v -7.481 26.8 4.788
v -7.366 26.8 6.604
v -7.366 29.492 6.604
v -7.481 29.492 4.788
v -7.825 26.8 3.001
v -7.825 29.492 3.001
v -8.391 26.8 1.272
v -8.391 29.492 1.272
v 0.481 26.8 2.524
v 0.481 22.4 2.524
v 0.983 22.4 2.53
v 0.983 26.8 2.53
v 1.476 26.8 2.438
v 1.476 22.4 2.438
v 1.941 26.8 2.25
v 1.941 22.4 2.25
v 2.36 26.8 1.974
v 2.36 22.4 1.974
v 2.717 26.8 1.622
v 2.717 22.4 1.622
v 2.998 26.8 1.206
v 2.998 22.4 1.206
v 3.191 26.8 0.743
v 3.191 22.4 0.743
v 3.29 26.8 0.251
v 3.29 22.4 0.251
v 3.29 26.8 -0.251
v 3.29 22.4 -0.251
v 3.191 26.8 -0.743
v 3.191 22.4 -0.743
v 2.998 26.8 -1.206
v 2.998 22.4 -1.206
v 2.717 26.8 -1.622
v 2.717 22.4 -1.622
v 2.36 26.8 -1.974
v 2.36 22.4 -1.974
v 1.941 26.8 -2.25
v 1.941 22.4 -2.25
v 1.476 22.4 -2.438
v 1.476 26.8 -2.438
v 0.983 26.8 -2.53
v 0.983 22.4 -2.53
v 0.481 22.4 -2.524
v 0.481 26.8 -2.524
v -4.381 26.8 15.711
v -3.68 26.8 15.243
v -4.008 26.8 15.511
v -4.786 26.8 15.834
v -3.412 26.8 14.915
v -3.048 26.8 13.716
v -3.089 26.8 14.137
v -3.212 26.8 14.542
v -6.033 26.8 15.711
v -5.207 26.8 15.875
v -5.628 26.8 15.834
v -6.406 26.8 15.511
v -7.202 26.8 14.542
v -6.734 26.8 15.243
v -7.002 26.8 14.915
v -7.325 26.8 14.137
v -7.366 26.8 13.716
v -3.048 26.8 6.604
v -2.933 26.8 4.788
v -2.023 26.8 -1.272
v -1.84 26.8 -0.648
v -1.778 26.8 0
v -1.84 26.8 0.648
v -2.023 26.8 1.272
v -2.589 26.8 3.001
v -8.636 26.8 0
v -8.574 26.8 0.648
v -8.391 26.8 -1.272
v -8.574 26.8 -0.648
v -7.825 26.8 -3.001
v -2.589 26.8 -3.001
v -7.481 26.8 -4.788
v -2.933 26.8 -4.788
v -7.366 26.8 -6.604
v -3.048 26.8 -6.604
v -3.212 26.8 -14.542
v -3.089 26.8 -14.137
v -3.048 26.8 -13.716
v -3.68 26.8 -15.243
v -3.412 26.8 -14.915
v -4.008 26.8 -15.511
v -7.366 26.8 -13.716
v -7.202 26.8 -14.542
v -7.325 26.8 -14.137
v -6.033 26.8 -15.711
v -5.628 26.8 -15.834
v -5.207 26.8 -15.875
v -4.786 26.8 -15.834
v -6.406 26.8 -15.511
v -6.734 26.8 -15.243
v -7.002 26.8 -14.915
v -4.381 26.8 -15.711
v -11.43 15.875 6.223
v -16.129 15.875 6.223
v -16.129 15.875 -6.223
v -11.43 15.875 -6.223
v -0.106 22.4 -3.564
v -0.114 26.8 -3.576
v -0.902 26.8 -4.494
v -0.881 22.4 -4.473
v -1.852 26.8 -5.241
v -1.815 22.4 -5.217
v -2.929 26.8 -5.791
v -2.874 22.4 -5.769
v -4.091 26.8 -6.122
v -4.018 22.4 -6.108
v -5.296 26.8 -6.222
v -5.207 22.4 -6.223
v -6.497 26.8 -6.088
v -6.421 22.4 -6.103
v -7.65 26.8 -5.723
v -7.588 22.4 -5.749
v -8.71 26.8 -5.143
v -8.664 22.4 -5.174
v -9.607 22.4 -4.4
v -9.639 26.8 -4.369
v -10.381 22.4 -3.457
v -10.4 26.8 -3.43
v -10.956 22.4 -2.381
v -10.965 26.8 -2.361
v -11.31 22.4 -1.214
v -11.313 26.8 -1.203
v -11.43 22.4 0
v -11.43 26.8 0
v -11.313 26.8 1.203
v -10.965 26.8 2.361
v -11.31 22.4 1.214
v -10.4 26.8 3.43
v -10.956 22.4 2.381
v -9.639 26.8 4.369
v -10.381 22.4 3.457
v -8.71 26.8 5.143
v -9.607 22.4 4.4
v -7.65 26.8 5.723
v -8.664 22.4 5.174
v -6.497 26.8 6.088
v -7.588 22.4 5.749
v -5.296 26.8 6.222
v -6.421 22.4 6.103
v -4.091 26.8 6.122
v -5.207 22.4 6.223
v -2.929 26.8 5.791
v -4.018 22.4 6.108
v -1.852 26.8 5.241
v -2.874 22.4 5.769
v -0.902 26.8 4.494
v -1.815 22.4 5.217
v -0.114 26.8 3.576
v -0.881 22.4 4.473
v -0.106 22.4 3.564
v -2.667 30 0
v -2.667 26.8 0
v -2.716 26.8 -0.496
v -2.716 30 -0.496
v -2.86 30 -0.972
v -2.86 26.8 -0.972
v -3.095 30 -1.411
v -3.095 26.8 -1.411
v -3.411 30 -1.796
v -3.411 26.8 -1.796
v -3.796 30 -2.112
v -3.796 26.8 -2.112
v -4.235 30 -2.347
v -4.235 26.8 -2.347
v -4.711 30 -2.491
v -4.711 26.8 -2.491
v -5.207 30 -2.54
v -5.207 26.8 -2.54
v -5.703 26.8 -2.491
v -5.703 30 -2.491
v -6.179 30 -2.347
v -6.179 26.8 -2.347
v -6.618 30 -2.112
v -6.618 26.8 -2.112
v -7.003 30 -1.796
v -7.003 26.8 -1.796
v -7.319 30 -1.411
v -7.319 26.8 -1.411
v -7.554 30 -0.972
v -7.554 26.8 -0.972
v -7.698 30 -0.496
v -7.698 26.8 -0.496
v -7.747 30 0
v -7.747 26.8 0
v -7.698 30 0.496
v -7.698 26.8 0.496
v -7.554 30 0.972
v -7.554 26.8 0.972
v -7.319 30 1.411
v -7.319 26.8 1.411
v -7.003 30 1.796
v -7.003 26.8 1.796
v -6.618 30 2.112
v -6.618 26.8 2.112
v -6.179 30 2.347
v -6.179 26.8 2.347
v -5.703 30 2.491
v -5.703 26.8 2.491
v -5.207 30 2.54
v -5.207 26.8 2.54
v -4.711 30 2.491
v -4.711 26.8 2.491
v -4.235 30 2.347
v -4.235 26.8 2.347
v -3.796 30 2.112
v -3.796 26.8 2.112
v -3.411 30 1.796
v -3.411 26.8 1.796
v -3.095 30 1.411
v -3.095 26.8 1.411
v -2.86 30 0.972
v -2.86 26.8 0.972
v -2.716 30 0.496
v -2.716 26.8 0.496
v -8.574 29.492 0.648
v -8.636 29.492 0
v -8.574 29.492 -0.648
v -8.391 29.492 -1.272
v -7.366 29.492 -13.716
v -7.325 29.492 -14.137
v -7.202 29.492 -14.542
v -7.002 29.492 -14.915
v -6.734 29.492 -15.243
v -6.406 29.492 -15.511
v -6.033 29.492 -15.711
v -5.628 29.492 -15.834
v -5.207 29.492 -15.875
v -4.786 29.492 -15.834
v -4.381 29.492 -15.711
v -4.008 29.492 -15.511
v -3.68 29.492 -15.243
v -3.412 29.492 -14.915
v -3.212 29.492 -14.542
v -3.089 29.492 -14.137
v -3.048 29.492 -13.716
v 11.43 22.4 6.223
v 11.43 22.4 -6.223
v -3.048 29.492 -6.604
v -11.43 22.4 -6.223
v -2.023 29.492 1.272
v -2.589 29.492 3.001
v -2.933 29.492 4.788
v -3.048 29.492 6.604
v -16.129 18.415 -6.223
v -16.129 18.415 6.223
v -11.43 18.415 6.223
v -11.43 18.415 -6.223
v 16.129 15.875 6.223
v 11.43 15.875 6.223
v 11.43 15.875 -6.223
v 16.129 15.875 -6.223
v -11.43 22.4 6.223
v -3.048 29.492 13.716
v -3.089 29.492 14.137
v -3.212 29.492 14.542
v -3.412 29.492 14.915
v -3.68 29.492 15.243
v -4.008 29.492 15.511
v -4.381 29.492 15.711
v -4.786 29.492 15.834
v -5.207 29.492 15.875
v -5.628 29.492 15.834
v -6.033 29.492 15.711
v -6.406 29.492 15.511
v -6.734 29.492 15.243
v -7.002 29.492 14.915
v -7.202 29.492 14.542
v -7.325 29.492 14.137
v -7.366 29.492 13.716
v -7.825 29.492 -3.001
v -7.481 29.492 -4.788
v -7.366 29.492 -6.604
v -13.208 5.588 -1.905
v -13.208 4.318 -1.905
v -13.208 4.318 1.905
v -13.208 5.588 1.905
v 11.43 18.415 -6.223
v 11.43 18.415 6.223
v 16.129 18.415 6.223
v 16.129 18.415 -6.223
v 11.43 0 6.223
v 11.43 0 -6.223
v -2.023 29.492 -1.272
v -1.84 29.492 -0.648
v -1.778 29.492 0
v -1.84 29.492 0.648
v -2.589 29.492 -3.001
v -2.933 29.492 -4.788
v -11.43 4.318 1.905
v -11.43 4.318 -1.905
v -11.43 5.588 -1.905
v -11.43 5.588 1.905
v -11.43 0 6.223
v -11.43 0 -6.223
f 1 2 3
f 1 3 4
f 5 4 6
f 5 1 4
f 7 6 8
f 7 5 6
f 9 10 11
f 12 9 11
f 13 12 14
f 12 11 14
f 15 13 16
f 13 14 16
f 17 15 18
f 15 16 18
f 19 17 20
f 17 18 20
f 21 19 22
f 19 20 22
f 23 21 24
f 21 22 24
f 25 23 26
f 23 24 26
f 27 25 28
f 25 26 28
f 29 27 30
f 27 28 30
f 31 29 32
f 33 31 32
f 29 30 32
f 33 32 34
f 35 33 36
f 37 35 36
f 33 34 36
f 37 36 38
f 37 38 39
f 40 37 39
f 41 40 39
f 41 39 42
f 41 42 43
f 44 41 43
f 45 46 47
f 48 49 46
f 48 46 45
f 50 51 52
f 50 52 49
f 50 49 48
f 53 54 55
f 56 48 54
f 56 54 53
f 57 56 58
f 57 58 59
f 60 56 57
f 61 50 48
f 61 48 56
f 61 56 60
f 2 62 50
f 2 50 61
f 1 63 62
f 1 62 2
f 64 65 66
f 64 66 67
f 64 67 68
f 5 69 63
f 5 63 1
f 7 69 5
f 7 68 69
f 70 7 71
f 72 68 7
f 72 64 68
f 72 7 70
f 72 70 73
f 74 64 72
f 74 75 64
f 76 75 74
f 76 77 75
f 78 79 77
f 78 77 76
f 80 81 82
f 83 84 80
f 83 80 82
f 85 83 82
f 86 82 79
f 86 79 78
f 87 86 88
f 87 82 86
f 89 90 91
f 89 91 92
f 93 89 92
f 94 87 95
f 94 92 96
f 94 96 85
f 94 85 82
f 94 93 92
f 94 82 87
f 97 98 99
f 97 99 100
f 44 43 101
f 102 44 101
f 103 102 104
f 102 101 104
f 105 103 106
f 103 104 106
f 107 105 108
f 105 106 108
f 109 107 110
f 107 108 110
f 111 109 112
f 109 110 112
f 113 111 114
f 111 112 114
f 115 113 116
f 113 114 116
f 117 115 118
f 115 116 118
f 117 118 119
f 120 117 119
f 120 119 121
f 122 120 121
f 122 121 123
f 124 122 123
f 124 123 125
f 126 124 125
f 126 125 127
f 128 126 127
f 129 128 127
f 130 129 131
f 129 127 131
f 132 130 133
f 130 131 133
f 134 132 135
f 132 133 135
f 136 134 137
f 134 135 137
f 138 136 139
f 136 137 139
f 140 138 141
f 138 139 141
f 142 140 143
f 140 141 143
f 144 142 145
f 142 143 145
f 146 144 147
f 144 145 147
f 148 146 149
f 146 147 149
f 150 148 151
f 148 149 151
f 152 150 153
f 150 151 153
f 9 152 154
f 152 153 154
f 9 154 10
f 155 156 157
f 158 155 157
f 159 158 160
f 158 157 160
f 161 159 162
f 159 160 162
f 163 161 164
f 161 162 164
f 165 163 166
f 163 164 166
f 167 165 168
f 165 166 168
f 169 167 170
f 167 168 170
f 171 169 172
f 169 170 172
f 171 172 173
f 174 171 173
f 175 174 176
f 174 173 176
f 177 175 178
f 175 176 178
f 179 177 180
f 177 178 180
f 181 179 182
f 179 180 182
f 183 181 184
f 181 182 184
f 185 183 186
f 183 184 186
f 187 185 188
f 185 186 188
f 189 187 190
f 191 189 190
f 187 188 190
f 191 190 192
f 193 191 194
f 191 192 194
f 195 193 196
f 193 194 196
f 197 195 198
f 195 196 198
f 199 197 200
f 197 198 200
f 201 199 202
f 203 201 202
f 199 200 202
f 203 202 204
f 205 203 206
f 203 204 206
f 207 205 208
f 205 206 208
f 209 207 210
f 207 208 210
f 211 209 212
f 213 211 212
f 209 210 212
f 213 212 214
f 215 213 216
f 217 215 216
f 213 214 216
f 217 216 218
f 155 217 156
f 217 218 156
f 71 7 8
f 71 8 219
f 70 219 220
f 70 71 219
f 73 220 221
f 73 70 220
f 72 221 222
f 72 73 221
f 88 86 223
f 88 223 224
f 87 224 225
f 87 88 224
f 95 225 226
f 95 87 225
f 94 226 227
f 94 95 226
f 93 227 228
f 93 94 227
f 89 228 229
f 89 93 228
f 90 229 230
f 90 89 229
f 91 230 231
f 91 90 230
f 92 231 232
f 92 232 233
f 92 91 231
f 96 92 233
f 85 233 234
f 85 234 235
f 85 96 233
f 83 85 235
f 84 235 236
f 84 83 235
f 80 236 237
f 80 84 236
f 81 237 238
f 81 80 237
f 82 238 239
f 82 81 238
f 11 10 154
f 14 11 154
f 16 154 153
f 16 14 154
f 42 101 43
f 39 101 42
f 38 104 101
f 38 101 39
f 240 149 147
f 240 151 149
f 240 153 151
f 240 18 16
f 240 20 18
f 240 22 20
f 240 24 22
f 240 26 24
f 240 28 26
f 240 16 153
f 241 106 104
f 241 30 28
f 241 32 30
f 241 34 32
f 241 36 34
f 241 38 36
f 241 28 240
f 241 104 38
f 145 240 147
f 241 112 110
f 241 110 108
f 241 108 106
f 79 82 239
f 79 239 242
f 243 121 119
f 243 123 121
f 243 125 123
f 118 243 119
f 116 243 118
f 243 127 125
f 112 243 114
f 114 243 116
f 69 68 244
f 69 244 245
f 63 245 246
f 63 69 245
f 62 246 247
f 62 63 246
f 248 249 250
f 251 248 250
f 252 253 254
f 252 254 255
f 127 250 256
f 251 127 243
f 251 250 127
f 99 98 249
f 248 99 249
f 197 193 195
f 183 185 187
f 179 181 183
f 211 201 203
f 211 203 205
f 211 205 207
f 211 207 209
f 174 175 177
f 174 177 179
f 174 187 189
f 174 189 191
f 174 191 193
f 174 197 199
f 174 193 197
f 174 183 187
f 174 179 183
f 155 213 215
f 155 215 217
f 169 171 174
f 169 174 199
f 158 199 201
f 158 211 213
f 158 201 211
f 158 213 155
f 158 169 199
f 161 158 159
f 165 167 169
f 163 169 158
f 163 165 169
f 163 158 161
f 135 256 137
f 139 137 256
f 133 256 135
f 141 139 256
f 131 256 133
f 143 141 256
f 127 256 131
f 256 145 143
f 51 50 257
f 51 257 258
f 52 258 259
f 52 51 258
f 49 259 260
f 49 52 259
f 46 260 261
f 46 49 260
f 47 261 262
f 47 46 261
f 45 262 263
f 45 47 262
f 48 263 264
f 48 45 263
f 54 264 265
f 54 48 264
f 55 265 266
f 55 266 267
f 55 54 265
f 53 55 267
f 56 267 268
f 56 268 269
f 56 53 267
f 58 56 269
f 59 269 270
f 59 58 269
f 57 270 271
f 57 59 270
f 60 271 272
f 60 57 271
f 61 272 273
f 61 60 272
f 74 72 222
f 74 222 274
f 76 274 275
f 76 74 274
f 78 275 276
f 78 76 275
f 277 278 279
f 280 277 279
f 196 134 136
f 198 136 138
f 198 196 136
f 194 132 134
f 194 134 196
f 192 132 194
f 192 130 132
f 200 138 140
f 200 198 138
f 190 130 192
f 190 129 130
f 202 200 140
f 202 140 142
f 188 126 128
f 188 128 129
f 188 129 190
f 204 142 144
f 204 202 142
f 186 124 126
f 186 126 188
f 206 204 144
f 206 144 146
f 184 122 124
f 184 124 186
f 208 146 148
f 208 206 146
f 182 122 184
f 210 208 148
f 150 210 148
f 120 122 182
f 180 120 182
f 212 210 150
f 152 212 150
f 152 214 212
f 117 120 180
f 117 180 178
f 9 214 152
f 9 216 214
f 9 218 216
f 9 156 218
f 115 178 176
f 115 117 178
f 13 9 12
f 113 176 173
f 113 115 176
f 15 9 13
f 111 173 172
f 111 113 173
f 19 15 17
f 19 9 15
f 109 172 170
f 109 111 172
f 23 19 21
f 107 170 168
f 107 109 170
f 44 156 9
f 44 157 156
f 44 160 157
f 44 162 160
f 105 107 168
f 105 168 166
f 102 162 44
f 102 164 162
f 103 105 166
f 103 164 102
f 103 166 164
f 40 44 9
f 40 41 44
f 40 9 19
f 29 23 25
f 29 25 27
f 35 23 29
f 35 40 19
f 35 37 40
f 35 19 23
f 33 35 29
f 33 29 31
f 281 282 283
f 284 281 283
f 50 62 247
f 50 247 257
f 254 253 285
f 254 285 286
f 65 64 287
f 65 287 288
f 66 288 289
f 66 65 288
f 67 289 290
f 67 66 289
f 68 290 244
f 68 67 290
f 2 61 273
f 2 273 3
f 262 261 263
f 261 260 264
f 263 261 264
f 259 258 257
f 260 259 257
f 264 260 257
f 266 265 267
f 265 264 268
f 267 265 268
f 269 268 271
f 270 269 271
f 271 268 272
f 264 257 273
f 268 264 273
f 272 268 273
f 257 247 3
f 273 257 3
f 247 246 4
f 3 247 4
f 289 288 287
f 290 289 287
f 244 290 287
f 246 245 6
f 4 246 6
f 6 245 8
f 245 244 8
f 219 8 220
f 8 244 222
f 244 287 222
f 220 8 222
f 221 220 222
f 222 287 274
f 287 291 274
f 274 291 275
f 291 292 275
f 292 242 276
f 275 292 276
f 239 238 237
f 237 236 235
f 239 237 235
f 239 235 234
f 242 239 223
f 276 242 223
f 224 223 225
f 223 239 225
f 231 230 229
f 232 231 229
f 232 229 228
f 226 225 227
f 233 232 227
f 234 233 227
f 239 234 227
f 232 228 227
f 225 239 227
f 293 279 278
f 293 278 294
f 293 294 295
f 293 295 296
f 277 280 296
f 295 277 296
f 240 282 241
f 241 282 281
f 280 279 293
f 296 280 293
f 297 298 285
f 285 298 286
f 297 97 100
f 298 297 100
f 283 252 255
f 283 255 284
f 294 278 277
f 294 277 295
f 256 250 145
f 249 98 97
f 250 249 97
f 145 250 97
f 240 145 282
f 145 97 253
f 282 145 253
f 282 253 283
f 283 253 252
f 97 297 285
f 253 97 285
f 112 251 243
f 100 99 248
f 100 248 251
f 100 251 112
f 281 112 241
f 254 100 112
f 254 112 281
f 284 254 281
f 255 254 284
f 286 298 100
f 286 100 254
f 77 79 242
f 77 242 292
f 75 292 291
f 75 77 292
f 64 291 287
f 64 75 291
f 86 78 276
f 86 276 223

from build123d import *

# Parameters (mm, degrees)
SKETCH1_W           = 22.86
SKETCH1_H           = 12.446
BOSS_EXTRUDE1_DEPTH = 22.4
SKETCH3_W           = 4.699
SKETCH3_H           = 2.54
BOSS_EXTRUDE3_DEPTH = 12.446
BOSS_EXTRUDE4_DEPTH = 4.4
SKETCH5_R           = 2.54
BOSS_EXTRUDE5_DEPTH = 3.2
BOSS_EXTRUDE6_DEPTH = 2.692
BOSS_EXTRUDE7_START = -4.318
SKETCH7_W           = 1.778
SKETCH7_H           = 3.81
BOSS_EXTRUDE7_DEPTH = 1.27


with BuildPart() as part:
    # Sketch1 → Boss-Extrude1 (new body)
    with BuildSketch(Plane(origin=(0, 0, 0), x_dir=(1, 0, 0), z_dir=(0, 1, 0))):
        Rectangle(SKETCH1_W, SKETCH1_H)
    extrude(amount=BOSS_EXTRUDE1_DEPTH)

    # Sketch3 → Boss-Extrude3 (add)
    with BuildSketch(Plane.XY.offset(6.223)):
        with Locations((-13.7795, 17.145)):
            Rectangle(SKETCH3_W, SKETCH3_H)
        with Locations((13.7795, 17.145)):
            Rectangle(SKETCH3_W, SKETCH3_H)
    extrude(amount=-BOSS_EXTRUDE3_DEPTH)

    # Sketch4 → Boss-Extrude4 (add)
    with BuildSketch(Plane(origin=(0, 22.4, 0), x_dir=(1, 0, 0), z_dir=(0, 1, 0))):
        with BuildLine():
            ThreePointArc((0.480978723, 2.524406275), (-11.43, 0), (0.480978723, -2.524406275))
            ThreePointArc((0.480978723, -2.524406275), (3.302, 0), (0.480978723, 2.524406275))
        make_face()
    extrude(amount=BOSS_EXTRUDE4_DEPTH)

    # Sketch5 → Boss-Extrude5 (add)
    with BuildSketch(Plane(origin=(0, 26.8, 0), x_dir=(1, 0, 0), z_dir=(0, 1, 0))):
        with Locations((-5.207, 0)):
            Circle(SKETCH5_R)
    extrude(amount=BOSS_EXTRUDE5_DEPTH)


with BuildPart() as body_2:
    # Sketch6 → Boss-Extrude6 (new body)
    with BuildSketch(Plane(origin=(0, 26.8, 0), x_dir=(1, 0, 0), z_dir=(0, 1, 0))):
        with BuildLine():
            Line((-7.366, 6.604), (-7.366, 13.716))
            ThreePointArc((-7.366, 13.716), (-5.207, 15.875), (-3.048, 13.716))
            Line((-3.048, 13.716), (-3.048, 6.604))
            ThreePointArc((-3.048, 6.604), (-2.789317484, 3.88905433), (-2.022579173, 1.271811698))
            ThreePointArc((-2.022579173, 1.271811698), (-1.778, 0), (-2.022579173, -1.271811698))
            ThreePointArc((-2.022579173, -1.271811698), (-2.789317484, -3.88905433), (-3.048, -6.604))
            Line((-3.048, -6.604), (-3.048, -13.716))
            ThreePointArc((-3.048, -13.716), (-5.207, -15.875), (-7.366, -13.716))
            Line((-7.366, -13.716), (-7.366, -6.604))
            ThreePointArc((-7.366, -6.604), (-7.624682516, -3.88905433), (-8.391420827, -1.271811698))
            ThreePointArc((-8.391420827, -1.271811698), (-8.636, 0), (-8.391420827, 1.271811698))
            ThreePointArc((-8.391420827, 1.271811698), (-7.624682516, 3.88905433), (-7.366, 6.604))
        make_face()
    extrude(amount=BOSS_EXTRUDE6_DEPTH)


with BuildPart() as body_3:
    # Sketch7 → Boss-Extrude7 (new body)
    with BuildSketch(Plane.XZ.offset(BOSS_EXTRUDE7_START)):
        with Locations((-12.319, 0)):
            Rectangle(SKETCH7_W, SKETCH7_H)
    extrude(amount=-BOSS_EXTRUDE7_DEPTH)


solid = Compound([part.part, body_2.part, body_3.part])
